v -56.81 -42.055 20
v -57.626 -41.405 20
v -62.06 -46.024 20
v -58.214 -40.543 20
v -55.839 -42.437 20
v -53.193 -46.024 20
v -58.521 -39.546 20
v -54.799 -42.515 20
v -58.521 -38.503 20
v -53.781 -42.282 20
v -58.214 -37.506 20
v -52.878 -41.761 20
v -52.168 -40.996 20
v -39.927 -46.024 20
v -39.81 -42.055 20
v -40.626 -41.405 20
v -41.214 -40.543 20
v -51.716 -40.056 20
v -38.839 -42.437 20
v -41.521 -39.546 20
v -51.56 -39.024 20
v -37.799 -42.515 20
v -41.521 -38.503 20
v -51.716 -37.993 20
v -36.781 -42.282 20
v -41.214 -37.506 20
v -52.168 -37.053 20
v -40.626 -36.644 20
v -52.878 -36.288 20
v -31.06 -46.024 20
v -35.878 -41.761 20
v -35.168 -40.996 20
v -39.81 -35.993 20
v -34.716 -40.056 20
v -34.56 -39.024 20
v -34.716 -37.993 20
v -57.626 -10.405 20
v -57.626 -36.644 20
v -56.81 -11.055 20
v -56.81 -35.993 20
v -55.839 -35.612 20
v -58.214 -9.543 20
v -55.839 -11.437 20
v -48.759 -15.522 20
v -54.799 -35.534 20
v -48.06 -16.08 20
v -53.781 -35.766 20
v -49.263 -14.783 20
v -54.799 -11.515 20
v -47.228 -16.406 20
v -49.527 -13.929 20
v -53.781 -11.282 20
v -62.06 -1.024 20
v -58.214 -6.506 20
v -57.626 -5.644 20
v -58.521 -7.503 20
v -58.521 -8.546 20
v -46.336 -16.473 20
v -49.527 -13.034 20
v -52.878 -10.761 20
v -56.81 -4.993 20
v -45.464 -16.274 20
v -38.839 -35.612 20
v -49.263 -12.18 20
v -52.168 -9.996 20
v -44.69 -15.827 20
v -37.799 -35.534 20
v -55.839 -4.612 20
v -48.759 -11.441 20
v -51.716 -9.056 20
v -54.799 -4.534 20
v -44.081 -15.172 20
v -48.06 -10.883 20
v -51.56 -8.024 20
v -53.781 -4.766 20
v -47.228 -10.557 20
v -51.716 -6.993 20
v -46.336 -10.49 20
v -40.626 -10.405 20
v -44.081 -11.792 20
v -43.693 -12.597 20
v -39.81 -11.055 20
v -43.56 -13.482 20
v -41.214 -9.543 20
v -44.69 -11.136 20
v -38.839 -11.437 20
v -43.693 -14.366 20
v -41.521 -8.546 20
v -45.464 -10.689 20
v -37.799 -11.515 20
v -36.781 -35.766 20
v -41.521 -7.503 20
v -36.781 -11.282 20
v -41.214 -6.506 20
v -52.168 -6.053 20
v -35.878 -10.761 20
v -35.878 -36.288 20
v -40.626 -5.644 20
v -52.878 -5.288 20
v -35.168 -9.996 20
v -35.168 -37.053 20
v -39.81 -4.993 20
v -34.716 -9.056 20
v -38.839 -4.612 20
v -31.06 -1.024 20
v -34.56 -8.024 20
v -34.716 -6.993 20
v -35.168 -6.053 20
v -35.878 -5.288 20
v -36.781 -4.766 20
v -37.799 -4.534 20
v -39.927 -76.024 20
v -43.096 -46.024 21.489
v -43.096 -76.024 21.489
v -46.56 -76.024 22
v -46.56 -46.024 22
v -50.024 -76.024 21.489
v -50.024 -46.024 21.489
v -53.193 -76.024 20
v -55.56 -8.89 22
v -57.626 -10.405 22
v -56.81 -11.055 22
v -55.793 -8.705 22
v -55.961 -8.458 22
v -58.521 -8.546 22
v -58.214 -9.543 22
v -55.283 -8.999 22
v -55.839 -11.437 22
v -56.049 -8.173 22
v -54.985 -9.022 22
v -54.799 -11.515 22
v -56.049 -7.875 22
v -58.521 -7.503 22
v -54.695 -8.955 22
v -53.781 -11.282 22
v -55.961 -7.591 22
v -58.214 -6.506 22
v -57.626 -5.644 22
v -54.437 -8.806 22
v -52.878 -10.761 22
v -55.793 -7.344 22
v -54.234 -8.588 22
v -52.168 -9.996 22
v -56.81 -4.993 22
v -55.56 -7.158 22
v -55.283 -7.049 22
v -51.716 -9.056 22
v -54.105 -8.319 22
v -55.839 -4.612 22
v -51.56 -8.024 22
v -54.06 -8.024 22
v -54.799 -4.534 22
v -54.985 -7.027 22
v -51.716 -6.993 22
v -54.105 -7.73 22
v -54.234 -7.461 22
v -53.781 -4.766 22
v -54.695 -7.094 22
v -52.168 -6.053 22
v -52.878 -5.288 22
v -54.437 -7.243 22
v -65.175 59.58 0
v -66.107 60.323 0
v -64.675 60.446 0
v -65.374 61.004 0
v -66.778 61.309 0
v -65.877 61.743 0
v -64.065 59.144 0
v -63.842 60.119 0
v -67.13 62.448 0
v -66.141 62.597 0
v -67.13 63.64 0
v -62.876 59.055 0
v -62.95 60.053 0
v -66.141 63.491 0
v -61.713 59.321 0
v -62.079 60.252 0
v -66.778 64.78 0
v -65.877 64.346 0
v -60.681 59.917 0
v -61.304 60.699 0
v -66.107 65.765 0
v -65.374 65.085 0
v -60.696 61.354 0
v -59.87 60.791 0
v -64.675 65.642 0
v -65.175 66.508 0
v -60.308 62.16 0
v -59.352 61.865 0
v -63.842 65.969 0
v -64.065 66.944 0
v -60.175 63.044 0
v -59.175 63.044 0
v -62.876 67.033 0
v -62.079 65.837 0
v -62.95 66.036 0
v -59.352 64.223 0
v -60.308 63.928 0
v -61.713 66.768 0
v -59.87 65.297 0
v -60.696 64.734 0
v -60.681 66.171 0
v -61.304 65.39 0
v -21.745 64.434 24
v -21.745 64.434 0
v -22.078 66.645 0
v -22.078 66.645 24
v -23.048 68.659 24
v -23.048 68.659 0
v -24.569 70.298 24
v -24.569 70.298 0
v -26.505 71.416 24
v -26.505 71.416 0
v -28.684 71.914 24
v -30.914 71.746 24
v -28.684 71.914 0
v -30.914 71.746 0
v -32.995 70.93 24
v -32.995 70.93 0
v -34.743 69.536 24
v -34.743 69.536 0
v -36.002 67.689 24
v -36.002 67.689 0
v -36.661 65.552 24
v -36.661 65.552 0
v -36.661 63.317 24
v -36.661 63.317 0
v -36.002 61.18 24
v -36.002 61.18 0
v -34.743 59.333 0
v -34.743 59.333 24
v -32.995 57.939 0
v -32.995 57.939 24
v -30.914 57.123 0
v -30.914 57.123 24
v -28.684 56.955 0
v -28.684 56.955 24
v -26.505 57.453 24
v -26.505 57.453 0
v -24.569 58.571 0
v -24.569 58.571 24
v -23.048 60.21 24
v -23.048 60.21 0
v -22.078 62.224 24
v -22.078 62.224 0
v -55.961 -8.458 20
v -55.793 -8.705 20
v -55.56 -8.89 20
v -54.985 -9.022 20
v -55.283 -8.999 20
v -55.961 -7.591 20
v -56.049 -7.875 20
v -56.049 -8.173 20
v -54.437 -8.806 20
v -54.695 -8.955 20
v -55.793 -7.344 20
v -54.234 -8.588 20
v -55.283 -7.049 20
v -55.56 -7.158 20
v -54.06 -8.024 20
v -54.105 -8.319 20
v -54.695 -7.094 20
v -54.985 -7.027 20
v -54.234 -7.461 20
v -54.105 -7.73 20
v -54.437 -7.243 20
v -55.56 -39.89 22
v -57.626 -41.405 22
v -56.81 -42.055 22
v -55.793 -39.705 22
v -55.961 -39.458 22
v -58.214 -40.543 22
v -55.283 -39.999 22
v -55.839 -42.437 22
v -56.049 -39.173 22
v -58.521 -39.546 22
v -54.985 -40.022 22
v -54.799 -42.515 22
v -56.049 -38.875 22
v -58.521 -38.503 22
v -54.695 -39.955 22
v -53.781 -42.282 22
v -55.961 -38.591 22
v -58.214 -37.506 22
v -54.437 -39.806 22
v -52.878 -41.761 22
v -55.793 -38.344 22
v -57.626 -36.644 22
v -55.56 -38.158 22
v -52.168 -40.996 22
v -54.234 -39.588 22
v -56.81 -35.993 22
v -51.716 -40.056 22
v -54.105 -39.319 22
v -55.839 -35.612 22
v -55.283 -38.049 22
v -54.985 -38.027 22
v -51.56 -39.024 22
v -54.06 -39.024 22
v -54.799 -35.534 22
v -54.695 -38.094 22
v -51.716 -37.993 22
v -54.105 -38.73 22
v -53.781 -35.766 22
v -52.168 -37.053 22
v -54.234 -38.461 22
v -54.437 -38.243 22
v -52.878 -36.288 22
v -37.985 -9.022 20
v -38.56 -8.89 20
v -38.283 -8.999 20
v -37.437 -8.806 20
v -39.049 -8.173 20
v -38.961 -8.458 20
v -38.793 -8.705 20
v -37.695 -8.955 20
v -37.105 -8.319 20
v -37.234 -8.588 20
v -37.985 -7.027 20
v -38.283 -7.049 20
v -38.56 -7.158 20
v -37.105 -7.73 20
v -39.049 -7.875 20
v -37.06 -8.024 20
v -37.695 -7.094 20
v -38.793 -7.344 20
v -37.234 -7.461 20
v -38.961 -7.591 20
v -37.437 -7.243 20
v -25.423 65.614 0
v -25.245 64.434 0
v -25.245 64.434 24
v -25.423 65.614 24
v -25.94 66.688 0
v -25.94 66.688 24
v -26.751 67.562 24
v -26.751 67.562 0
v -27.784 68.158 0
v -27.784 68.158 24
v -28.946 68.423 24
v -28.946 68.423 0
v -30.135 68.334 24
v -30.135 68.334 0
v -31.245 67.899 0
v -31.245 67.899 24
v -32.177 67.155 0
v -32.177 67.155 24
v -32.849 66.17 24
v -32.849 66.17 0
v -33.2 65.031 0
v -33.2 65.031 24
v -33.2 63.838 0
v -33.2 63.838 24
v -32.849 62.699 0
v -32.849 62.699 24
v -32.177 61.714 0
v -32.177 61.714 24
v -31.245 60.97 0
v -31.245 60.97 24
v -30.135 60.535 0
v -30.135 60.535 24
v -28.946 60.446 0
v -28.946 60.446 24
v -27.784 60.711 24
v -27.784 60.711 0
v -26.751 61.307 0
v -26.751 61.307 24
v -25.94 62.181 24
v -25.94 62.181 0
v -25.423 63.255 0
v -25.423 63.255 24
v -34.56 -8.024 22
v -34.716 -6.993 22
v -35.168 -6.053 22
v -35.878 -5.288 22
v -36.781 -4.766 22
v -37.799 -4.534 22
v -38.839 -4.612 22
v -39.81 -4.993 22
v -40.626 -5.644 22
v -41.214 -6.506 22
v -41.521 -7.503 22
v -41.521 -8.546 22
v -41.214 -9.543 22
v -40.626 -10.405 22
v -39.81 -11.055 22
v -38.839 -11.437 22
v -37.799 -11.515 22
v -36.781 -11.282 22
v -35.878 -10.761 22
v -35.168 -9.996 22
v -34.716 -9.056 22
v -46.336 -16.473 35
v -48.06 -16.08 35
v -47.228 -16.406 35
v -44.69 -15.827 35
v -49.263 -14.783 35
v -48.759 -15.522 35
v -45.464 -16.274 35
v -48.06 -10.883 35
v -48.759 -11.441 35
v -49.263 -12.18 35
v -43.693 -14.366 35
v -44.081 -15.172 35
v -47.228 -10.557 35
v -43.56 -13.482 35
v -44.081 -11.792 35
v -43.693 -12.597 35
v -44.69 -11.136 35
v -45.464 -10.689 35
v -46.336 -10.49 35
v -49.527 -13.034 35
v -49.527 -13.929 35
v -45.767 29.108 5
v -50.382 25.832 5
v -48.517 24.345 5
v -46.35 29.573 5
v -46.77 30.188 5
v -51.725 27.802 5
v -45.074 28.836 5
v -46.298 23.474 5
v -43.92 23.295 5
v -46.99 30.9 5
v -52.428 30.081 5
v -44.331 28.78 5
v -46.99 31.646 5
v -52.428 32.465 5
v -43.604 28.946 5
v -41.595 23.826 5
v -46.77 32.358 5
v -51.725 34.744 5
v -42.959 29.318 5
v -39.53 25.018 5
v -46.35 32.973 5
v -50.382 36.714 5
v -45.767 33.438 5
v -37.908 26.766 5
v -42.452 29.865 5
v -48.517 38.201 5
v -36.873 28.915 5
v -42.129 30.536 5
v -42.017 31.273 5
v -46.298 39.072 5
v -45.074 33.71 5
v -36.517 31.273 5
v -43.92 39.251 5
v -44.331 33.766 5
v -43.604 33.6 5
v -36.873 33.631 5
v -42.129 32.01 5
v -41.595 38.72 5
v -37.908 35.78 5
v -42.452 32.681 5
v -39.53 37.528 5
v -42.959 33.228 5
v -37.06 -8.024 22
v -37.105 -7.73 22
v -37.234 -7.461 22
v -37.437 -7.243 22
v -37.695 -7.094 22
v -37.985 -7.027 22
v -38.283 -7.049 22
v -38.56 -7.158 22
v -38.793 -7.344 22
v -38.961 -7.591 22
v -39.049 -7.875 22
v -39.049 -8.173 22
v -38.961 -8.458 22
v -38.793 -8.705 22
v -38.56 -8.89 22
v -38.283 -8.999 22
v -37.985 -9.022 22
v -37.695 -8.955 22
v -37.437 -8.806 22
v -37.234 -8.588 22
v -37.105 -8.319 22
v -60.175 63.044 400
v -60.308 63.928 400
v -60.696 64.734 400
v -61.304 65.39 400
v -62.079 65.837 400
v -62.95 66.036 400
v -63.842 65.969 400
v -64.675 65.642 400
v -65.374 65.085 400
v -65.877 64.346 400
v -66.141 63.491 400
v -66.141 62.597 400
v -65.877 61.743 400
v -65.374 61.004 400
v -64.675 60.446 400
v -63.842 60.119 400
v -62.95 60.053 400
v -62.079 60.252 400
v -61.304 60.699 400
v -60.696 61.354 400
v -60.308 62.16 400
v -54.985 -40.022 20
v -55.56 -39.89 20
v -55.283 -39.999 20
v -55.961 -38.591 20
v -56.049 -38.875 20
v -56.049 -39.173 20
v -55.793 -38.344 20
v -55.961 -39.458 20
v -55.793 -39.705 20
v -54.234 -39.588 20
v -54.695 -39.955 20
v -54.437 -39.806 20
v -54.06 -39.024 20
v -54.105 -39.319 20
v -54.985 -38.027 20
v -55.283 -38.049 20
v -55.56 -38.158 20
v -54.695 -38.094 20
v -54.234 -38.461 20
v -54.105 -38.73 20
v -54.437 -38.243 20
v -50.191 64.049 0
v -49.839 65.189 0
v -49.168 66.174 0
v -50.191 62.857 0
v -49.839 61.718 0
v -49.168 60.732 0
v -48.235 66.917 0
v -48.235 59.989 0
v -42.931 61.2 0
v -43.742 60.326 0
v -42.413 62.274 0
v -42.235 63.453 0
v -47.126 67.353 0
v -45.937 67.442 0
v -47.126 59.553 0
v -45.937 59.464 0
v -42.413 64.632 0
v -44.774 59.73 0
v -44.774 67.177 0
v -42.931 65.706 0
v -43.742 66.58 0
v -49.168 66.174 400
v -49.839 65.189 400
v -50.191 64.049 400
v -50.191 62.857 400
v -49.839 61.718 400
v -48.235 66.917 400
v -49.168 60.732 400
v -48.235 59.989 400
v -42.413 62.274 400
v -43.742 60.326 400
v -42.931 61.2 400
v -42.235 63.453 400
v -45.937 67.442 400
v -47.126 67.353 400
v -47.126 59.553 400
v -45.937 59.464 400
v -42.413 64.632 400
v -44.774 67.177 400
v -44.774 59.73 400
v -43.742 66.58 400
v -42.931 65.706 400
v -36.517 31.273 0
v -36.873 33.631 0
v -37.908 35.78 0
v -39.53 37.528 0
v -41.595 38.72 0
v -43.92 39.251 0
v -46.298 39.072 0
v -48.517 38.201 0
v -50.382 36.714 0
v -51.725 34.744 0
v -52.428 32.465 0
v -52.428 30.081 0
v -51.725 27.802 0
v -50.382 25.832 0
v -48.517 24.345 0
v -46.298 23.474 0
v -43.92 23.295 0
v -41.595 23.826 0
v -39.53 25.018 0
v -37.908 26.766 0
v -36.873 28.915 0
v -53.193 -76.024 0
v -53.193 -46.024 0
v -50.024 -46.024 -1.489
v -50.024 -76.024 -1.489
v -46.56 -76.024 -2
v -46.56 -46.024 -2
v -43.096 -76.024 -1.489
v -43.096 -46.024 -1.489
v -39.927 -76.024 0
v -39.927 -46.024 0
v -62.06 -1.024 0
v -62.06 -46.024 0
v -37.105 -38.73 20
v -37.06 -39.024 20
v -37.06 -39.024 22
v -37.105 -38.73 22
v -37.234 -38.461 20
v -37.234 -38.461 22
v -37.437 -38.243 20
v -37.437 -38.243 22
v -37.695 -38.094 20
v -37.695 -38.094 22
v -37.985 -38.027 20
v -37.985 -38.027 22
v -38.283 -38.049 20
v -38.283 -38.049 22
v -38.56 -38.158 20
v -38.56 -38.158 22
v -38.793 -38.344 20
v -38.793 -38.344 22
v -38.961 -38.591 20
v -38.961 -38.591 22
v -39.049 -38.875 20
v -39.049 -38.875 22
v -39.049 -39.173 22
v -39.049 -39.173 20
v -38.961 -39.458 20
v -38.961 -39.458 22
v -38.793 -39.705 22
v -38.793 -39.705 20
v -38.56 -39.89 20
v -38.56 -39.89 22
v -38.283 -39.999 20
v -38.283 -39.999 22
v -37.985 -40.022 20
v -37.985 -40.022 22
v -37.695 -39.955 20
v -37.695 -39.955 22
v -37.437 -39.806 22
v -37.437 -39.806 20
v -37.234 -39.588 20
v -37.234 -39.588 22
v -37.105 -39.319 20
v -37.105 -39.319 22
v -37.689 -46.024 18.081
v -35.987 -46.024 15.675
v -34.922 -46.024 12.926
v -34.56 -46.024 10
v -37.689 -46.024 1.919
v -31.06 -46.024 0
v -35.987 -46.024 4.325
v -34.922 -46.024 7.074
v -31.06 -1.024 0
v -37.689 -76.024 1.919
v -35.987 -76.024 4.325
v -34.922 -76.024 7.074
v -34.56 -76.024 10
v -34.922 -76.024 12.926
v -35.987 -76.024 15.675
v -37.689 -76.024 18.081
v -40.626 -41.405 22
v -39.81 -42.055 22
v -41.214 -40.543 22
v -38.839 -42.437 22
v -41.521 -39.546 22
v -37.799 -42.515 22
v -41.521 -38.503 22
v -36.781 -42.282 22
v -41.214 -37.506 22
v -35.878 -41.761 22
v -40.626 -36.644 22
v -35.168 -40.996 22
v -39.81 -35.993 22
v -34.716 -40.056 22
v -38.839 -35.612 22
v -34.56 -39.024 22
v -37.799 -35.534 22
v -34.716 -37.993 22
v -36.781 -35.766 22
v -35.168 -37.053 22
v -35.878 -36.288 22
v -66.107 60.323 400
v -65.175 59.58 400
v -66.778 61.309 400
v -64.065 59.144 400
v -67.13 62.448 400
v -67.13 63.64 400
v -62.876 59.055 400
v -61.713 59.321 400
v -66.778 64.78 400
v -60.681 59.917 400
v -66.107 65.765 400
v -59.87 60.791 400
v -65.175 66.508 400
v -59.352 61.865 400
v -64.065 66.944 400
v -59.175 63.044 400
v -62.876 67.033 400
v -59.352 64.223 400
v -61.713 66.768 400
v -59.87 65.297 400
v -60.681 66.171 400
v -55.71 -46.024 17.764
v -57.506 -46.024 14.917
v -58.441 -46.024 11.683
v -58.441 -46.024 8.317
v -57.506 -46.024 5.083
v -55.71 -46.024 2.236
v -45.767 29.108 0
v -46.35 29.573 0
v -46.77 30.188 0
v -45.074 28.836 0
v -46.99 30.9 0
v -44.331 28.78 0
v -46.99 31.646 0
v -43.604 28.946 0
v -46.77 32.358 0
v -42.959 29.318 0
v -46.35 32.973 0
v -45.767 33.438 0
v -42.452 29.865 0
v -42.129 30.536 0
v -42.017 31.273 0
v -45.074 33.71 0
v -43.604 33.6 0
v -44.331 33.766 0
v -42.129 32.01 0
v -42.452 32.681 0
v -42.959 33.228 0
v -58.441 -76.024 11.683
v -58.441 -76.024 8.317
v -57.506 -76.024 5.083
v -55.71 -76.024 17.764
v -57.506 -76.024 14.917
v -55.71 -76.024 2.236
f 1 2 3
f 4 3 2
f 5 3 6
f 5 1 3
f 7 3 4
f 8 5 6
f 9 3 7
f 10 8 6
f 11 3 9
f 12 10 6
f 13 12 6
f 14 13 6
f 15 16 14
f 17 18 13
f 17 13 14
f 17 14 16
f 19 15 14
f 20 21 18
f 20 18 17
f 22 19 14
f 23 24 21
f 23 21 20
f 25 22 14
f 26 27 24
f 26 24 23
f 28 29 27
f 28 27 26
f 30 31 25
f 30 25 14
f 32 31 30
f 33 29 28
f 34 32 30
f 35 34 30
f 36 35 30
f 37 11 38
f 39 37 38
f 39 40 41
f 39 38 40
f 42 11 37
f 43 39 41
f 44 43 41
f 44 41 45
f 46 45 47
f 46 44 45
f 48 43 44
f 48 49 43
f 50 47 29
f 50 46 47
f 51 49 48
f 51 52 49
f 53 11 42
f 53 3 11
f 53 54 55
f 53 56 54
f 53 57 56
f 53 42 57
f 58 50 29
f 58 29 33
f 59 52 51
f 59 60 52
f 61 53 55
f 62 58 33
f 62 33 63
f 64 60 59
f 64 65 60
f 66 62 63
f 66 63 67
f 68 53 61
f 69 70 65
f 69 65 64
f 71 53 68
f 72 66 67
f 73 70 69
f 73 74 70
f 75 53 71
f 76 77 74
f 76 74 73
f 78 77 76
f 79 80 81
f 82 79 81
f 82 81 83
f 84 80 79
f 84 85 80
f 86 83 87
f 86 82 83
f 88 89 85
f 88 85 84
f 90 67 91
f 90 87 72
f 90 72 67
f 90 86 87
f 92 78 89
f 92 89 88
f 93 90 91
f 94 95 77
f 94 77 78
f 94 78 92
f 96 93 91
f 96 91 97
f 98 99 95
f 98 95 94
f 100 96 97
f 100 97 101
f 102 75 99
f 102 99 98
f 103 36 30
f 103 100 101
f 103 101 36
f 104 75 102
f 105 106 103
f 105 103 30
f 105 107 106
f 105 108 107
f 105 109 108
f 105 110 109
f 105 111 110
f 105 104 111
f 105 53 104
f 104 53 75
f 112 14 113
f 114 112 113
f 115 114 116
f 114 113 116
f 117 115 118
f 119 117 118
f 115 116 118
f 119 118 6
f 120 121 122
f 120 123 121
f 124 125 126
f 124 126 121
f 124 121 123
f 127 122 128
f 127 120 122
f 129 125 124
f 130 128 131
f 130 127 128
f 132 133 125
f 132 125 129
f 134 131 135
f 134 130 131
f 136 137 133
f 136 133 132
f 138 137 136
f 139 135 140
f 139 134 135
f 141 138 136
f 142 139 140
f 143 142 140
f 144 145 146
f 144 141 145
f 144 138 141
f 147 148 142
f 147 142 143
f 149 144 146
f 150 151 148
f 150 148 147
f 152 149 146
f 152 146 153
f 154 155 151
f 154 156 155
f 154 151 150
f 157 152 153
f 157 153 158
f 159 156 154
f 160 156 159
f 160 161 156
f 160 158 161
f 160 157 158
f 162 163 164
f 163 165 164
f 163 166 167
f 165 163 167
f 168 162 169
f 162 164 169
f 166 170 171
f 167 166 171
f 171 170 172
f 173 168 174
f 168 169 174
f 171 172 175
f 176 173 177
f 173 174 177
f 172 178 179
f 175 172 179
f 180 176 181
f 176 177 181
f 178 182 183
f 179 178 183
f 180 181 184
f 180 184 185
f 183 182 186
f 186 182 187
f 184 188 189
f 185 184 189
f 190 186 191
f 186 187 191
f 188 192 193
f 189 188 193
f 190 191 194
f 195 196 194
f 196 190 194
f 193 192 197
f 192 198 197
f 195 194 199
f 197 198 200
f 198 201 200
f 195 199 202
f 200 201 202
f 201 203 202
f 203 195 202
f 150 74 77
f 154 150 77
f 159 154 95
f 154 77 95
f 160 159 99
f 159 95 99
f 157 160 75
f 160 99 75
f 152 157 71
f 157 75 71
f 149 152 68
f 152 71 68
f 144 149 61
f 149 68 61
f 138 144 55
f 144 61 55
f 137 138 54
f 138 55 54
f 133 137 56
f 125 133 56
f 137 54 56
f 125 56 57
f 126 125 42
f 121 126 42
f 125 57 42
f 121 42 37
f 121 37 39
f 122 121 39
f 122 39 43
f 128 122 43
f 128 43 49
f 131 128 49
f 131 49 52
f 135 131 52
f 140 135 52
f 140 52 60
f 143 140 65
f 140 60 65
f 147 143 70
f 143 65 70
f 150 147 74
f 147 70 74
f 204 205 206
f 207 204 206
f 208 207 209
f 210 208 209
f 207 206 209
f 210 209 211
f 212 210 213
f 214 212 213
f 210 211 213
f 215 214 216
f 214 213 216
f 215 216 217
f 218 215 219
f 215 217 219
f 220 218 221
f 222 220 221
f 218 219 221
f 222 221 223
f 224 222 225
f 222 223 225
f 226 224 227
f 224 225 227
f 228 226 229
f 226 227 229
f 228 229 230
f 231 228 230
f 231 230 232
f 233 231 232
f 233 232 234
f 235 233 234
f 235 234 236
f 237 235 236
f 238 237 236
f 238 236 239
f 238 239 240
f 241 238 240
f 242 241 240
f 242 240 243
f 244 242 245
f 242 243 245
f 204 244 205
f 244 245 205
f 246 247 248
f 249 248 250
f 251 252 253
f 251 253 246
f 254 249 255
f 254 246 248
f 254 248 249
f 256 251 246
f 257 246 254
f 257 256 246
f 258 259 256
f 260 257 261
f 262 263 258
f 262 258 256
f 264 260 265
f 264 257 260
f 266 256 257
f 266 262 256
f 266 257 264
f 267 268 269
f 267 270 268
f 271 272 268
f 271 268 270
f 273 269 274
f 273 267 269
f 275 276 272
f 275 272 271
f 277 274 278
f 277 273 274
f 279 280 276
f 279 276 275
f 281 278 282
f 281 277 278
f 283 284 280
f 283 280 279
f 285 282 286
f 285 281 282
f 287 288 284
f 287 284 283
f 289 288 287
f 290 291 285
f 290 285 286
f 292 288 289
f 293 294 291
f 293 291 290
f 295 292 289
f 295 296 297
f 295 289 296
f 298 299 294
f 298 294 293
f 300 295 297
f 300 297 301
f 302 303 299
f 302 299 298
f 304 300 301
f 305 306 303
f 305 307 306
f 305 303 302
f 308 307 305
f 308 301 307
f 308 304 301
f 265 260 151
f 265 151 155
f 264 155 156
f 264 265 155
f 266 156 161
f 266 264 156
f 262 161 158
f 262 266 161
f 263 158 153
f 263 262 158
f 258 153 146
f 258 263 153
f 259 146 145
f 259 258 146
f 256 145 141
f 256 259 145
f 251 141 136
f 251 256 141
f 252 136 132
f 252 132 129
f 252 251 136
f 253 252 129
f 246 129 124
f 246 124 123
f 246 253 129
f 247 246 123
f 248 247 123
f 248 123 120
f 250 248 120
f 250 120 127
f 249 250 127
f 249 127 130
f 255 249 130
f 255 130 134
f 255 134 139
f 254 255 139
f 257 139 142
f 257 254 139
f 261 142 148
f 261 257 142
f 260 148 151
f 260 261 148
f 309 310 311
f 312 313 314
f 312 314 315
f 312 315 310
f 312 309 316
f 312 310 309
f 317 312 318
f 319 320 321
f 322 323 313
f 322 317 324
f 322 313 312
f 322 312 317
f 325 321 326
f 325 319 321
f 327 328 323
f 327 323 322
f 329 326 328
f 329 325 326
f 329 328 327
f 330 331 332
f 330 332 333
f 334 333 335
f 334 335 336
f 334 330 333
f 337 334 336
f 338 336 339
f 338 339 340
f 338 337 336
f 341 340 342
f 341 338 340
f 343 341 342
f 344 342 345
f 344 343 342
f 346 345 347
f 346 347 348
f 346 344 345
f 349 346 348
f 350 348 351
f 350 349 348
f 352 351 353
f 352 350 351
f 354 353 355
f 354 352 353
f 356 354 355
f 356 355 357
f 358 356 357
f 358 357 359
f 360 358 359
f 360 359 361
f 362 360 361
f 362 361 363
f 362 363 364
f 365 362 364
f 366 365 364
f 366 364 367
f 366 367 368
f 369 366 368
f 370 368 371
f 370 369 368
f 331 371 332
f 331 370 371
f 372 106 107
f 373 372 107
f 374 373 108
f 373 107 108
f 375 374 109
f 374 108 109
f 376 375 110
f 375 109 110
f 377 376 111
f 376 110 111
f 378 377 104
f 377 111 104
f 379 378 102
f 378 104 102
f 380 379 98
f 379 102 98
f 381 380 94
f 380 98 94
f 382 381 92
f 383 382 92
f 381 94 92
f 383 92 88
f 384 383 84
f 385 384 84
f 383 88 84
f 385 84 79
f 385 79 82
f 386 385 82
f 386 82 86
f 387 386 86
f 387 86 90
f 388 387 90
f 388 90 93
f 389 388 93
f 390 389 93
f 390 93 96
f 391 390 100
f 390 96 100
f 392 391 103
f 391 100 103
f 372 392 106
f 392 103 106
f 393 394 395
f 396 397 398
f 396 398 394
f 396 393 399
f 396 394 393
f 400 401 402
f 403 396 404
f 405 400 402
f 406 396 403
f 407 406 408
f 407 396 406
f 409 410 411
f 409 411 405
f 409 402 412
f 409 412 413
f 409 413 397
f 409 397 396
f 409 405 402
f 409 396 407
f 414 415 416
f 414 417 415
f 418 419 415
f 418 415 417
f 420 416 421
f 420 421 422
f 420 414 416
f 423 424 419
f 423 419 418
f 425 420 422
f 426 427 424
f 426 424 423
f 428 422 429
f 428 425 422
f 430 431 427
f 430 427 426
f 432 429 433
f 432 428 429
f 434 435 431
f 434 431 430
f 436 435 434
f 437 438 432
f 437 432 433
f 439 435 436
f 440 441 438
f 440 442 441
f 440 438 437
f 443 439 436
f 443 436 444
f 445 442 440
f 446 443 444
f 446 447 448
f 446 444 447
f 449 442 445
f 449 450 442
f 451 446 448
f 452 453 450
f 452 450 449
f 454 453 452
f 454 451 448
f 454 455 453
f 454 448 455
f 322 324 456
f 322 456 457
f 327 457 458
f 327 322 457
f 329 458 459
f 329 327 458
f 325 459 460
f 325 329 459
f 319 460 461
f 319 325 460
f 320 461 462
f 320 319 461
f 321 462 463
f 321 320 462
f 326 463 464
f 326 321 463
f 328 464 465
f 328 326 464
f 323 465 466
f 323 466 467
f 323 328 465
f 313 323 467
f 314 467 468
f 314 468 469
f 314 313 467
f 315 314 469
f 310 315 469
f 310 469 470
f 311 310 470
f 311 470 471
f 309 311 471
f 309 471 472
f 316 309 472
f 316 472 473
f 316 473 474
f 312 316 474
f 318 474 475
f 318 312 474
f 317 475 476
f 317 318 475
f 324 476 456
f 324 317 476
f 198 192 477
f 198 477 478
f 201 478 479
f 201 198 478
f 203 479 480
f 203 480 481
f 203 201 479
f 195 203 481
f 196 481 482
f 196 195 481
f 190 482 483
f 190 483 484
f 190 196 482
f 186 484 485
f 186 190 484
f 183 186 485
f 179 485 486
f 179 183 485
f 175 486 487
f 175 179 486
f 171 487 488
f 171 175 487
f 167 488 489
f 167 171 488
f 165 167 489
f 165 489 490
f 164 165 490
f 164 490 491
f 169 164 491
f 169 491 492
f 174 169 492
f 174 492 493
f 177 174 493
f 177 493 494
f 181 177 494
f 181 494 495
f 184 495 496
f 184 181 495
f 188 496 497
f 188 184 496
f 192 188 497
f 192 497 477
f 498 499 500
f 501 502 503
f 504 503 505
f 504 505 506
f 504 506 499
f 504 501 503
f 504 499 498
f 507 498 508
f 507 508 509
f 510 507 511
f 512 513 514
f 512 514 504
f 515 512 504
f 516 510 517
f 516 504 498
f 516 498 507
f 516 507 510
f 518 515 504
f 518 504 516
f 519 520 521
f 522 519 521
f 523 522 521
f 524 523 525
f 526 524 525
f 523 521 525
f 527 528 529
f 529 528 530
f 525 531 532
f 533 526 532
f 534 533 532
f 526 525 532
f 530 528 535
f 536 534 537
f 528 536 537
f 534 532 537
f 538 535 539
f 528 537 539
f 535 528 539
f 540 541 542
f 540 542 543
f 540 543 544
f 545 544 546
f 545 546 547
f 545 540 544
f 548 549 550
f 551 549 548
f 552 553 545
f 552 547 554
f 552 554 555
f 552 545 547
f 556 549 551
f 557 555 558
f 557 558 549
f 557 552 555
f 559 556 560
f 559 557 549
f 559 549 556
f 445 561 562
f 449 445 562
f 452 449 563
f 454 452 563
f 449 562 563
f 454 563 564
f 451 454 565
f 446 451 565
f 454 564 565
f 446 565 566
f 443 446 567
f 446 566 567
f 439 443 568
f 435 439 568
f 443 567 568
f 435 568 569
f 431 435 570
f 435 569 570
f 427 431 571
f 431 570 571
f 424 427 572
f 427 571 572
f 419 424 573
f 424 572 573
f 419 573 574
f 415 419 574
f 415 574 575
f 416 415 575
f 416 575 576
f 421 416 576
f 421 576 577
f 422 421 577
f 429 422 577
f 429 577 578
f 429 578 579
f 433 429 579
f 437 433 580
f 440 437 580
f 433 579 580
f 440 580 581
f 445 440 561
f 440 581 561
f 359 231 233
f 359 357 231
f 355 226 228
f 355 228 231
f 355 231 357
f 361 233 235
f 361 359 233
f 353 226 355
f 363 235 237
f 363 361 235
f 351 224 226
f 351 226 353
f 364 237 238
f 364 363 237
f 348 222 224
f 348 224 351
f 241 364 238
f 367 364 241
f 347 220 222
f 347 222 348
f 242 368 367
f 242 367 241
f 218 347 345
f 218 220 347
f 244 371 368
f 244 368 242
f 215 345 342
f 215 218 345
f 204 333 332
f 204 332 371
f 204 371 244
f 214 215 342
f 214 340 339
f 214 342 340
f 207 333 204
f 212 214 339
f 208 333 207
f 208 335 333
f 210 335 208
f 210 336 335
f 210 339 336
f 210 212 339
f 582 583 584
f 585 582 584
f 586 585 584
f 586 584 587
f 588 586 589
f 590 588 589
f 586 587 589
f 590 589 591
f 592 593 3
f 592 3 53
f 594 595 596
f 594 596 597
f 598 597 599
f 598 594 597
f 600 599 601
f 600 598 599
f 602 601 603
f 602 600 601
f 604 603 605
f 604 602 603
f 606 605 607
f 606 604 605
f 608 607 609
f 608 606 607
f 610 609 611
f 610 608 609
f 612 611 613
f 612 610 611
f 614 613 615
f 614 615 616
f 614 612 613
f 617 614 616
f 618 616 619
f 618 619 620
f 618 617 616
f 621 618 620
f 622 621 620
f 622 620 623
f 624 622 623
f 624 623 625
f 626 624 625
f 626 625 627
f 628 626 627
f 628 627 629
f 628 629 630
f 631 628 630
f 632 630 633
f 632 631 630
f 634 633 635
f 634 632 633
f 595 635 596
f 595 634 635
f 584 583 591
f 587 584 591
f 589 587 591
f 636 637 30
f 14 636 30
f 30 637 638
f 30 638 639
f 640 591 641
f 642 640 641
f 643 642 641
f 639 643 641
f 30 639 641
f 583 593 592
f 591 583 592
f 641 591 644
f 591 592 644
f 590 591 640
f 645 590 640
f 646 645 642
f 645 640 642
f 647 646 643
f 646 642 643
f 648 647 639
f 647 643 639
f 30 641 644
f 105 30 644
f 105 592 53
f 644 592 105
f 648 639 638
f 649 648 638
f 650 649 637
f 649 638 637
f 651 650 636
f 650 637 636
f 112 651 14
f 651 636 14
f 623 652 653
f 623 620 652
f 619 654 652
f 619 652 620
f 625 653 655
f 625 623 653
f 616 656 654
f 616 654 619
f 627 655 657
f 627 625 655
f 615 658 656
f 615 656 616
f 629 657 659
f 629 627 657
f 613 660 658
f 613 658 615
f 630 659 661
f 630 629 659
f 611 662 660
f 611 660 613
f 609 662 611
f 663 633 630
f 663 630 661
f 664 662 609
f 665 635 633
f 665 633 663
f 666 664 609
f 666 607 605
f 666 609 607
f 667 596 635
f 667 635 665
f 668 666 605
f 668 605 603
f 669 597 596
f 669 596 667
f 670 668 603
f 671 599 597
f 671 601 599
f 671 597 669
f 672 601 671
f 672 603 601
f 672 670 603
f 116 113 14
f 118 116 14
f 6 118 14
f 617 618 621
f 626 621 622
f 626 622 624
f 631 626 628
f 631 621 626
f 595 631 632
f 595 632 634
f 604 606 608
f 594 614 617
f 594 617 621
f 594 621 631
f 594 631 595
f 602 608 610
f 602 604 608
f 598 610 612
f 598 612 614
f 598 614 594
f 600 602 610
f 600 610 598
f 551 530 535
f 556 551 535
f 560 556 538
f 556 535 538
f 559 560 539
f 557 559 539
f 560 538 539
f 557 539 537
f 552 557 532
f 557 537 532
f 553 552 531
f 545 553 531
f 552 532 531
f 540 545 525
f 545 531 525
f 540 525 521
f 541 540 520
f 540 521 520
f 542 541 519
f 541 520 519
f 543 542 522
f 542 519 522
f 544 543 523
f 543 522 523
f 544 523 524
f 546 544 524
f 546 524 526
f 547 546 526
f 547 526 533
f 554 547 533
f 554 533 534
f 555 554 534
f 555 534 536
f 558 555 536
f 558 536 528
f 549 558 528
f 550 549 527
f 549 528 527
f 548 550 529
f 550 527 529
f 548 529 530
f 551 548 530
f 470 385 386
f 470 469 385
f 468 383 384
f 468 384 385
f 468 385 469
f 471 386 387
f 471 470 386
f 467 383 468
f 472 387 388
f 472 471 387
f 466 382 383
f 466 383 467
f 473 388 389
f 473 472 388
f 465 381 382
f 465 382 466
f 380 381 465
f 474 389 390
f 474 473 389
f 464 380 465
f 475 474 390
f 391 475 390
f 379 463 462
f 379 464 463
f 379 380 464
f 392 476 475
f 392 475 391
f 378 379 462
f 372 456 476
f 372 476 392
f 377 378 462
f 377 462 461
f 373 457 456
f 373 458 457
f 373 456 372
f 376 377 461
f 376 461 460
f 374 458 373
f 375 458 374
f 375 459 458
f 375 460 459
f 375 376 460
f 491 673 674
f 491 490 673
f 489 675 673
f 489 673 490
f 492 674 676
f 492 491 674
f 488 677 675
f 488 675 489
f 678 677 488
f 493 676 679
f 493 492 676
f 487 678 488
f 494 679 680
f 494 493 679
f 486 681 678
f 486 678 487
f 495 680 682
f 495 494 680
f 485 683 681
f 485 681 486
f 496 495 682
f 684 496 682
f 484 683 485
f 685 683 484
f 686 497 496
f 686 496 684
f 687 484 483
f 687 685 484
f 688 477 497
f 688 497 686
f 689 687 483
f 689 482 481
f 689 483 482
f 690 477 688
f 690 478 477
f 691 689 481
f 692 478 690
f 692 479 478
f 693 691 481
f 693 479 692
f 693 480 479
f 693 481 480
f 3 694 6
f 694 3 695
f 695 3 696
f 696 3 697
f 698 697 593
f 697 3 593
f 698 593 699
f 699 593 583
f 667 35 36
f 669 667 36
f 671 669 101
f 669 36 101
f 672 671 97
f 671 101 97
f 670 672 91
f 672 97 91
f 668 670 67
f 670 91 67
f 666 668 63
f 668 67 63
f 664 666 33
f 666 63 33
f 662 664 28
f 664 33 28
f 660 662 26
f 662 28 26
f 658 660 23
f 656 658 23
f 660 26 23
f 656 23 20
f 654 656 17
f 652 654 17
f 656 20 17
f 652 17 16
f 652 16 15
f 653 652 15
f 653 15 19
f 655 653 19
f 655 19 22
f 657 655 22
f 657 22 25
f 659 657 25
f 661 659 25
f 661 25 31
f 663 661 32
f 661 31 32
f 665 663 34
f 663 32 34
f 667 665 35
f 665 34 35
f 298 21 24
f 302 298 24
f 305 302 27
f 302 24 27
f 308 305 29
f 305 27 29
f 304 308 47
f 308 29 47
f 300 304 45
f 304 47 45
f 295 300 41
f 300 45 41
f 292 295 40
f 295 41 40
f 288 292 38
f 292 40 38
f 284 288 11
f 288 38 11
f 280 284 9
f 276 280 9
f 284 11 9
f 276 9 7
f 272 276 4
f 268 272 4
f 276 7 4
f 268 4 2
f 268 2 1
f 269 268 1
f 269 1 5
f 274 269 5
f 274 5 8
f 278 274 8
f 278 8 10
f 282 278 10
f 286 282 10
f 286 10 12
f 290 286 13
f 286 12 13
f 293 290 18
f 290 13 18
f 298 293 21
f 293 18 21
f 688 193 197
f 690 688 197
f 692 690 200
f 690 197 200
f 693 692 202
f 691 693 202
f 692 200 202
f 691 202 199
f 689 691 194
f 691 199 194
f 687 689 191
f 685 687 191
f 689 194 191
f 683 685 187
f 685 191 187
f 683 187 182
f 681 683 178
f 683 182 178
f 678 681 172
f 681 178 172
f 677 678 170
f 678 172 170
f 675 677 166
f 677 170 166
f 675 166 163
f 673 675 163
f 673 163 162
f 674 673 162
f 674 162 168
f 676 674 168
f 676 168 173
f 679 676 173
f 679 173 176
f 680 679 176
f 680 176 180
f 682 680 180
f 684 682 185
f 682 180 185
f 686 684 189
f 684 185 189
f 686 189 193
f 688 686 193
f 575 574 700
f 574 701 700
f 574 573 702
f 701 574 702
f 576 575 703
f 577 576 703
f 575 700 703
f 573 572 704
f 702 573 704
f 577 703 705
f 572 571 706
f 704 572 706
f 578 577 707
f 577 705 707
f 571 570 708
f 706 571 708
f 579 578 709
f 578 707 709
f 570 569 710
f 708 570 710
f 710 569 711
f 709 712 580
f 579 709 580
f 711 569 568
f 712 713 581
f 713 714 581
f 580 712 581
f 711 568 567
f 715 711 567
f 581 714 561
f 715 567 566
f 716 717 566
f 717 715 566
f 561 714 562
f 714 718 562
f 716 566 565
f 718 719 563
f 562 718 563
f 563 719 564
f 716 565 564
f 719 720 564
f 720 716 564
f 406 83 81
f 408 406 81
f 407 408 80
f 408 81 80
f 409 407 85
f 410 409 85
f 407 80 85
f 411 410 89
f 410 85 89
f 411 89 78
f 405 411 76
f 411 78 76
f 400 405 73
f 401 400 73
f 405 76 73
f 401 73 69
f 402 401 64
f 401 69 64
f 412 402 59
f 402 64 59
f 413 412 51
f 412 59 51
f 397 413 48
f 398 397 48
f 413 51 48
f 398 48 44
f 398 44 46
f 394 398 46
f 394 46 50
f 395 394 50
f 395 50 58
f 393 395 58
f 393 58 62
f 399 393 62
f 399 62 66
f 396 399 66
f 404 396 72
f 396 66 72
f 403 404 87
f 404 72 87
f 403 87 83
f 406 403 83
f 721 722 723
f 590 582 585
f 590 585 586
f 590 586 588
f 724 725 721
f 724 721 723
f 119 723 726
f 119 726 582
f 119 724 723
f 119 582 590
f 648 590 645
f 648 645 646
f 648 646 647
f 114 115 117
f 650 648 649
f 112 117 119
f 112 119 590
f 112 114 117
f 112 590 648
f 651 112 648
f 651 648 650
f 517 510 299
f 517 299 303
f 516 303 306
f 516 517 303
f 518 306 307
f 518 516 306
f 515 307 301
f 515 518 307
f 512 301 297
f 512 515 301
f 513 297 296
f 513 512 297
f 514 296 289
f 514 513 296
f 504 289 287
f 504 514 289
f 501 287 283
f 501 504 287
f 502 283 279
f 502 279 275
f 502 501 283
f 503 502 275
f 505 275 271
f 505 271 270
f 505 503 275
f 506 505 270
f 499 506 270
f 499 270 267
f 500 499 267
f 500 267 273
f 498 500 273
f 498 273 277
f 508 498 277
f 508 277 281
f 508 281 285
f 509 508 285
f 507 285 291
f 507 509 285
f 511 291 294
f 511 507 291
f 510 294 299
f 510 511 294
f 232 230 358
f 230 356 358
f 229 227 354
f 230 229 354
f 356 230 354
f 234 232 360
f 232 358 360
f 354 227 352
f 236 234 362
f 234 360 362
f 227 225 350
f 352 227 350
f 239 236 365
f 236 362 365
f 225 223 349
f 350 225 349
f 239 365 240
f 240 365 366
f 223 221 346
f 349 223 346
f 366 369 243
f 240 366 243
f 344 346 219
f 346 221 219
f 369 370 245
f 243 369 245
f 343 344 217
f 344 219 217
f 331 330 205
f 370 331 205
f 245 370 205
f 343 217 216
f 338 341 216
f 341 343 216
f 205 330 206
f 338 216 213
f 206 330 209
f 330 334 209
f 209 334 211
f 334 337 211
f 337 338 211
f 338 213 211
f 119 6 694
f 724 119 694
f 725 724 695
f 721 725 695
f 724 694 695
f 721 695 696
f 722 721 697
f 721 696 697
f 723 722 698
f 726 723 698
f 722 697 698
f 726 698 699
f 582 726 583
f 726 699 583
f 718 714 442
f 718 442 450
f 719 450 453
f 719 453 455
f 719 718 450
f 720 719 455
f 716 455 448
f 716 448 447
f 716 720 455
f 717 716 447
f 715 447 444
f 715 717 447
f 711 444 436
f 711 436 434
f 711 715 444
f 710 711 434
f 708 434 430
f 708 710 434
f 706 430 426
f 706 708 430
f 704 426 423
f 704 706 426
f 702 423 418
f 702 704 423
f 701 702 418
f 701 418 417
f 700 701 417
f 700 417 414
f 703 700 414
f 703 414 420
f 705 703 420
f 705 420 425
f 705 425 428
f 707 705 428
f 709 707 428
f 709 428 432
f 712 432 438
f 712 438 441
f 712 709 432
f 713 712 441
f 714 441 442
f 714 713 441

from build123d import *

# Parameters (mm, degrees)
F0_R      = 4
F0_R_2    = 3
F1_DEPTH  = 400
F0_R_3    = 7.5
F2_DEPTH  = 24
F3_W      = 31
F3_H      = 45
F4_DEPTH  = 20
F6_DEPTH  = 30
F8_R      = 3.5
F8_R_2    = 1
F9_DEPTH  = 2
F8_R_3    = 3
F10_DEPTH = 15
F0_R_4    = 8
F0_R_5    = 2.5
F11_DEPTH = 5


with BuildPart() as f1:
    # F0 (on Top) → F1 (new body)
    with BuildSketch(Plane.XY):
        with Locations((-63.1745830178, 63.0441606045)):
            Circle(F0_R)
        with Locations((-63.1745830178, 63.0441606045)):
            Circle(F0_R_2, mode=Mode.SUBTRACT)
    extrude(amount=F1_DEPTH)


with BuildPart() as f1b:
    # F0 (on Top) → F1, piece 2 (new body)
    with BuildSketch(Plane.XY):
        with Locations((-46.235486865, 63.4531006217)):
            Circle(F0_R)
    extrude(amount=F1_DEPTH)


with BuildPart() as f2:
    # F0 (on Top) → F2 (new body)
    with BuildSketch(Plane.XY):
        with Locations((-29.2448699474, 64.4344985485)):
            Circle(F0_R_3)
        with Locations((-29.2448699474, 64.4344985485)):
            Circle(F0_R, mode=Mode.SUBTRACT)
    extrude(amount=F2_DEPTH)


with BuildPart() as f4:
    # F3 (on Top) → F4 (new body)
    with BuildSketch(Plane.XY):
        with Locations((-46.5601142496, -23.5244012473)):
            Rectangle(F3_W, F3_H)
    extrude(amount=F4_DEPTH)

    # F5 (on face) → F6 (join)
    with BuildSketch(Plane.XZ.offset(46.0244012473)):
        with BuildLine():
            ThreePointArc((-39.9268646689, 0), (-35.9865861022, 4.3254513381), (-34.5601142496, 10))
            ThreePointArc((-34.5601142496, 10), (-35.9865861022, 15.6745486619), (-39.9268646689, 20))
            Line((-39.9268646689, 20), (-53.1933638303, 20))
            ThreePointArc((-53.1933638303, 20), (-58.5601142496, 10), (-53.1933638303, 0))
            Line((-53.1933638303, 0), (-39.9268646689, 0))
        make_face()
        with BuildLine():
            Line((-53.1933638303, 20), (-39.9268646689, 20))
            ThreePointArc((-39.9268646689, 20), (-46.5601142496, 22), (-53.1933638303, 20))
        make_face()
        with BuildLine():
            ThreePointArc((-53.1933638303, 0), (-46.5601142496, -2), (-39.9268646689, 0))
            Line((-39.9268646689, 0), (-53.1933638303, 0))
        make_face()
    extrude(amount=F6_DEPTH)

    # F8 (on face) → F9 (join)
    with BuildSketch(Plane.XY.offset(20)):
        with Locations((-55.0601142496, -8.0244012473)):
            Circle(F8_R)
        with Locations((-55.0601142496, -8.0244012473)):
            Circle(F8_R_2, mode=Mode.SUBTRACT)
        with Locations((-38.0601142496, -8.0244012473)):
            Circle(F8_R)
        with Locations((-38.0601142496, -8.0244012473)):
            Circle(F8_R_2, mode=Mode.SUBTRACT)
        with Locations((-38.0601142496, -39.0244012473)):
            Circle(F8_R)
        with Locations((-38.0601142496, -39.0244012473)):
            Circle(F8_R_2, mode=Mode.SUBTRACT)
        with Locations((-55.0601142496, -39.0244012473)):
            Circle(F8_R)
        with Locations((-55.0601142496, -39.0244012473)):
            Circle(F8_R_2, mode=Mode.SUBTRACT)
    extrude(amount=F9_DEPTH)

    # F8 (on face) → F10 (join)
    with BuildSketch(Plane.XY.offset(20)):
        with Locations((-46.5601142496, -13.4815536439)):
            Circle(F8_R_3)
    extrude(amount=F10_DEPTH)


with BuildPart() as f11:
    # F0 (on Top) → F11 (new body)
    with BuildSketch(Plane.XY):
        with Locations((-44.5174388587, 31.2729626894)):
            Circle(F0_R_4)
        with Locations((-44.5174388587, 31.2729626894)):
            Circle(F0_R_5, mode=Mode.SUBTRACT)
    extrude(amount=F11_DEPTH)


solid = Compound([f1.part, f1b.part, f2.part, f4.part, f11.part])
